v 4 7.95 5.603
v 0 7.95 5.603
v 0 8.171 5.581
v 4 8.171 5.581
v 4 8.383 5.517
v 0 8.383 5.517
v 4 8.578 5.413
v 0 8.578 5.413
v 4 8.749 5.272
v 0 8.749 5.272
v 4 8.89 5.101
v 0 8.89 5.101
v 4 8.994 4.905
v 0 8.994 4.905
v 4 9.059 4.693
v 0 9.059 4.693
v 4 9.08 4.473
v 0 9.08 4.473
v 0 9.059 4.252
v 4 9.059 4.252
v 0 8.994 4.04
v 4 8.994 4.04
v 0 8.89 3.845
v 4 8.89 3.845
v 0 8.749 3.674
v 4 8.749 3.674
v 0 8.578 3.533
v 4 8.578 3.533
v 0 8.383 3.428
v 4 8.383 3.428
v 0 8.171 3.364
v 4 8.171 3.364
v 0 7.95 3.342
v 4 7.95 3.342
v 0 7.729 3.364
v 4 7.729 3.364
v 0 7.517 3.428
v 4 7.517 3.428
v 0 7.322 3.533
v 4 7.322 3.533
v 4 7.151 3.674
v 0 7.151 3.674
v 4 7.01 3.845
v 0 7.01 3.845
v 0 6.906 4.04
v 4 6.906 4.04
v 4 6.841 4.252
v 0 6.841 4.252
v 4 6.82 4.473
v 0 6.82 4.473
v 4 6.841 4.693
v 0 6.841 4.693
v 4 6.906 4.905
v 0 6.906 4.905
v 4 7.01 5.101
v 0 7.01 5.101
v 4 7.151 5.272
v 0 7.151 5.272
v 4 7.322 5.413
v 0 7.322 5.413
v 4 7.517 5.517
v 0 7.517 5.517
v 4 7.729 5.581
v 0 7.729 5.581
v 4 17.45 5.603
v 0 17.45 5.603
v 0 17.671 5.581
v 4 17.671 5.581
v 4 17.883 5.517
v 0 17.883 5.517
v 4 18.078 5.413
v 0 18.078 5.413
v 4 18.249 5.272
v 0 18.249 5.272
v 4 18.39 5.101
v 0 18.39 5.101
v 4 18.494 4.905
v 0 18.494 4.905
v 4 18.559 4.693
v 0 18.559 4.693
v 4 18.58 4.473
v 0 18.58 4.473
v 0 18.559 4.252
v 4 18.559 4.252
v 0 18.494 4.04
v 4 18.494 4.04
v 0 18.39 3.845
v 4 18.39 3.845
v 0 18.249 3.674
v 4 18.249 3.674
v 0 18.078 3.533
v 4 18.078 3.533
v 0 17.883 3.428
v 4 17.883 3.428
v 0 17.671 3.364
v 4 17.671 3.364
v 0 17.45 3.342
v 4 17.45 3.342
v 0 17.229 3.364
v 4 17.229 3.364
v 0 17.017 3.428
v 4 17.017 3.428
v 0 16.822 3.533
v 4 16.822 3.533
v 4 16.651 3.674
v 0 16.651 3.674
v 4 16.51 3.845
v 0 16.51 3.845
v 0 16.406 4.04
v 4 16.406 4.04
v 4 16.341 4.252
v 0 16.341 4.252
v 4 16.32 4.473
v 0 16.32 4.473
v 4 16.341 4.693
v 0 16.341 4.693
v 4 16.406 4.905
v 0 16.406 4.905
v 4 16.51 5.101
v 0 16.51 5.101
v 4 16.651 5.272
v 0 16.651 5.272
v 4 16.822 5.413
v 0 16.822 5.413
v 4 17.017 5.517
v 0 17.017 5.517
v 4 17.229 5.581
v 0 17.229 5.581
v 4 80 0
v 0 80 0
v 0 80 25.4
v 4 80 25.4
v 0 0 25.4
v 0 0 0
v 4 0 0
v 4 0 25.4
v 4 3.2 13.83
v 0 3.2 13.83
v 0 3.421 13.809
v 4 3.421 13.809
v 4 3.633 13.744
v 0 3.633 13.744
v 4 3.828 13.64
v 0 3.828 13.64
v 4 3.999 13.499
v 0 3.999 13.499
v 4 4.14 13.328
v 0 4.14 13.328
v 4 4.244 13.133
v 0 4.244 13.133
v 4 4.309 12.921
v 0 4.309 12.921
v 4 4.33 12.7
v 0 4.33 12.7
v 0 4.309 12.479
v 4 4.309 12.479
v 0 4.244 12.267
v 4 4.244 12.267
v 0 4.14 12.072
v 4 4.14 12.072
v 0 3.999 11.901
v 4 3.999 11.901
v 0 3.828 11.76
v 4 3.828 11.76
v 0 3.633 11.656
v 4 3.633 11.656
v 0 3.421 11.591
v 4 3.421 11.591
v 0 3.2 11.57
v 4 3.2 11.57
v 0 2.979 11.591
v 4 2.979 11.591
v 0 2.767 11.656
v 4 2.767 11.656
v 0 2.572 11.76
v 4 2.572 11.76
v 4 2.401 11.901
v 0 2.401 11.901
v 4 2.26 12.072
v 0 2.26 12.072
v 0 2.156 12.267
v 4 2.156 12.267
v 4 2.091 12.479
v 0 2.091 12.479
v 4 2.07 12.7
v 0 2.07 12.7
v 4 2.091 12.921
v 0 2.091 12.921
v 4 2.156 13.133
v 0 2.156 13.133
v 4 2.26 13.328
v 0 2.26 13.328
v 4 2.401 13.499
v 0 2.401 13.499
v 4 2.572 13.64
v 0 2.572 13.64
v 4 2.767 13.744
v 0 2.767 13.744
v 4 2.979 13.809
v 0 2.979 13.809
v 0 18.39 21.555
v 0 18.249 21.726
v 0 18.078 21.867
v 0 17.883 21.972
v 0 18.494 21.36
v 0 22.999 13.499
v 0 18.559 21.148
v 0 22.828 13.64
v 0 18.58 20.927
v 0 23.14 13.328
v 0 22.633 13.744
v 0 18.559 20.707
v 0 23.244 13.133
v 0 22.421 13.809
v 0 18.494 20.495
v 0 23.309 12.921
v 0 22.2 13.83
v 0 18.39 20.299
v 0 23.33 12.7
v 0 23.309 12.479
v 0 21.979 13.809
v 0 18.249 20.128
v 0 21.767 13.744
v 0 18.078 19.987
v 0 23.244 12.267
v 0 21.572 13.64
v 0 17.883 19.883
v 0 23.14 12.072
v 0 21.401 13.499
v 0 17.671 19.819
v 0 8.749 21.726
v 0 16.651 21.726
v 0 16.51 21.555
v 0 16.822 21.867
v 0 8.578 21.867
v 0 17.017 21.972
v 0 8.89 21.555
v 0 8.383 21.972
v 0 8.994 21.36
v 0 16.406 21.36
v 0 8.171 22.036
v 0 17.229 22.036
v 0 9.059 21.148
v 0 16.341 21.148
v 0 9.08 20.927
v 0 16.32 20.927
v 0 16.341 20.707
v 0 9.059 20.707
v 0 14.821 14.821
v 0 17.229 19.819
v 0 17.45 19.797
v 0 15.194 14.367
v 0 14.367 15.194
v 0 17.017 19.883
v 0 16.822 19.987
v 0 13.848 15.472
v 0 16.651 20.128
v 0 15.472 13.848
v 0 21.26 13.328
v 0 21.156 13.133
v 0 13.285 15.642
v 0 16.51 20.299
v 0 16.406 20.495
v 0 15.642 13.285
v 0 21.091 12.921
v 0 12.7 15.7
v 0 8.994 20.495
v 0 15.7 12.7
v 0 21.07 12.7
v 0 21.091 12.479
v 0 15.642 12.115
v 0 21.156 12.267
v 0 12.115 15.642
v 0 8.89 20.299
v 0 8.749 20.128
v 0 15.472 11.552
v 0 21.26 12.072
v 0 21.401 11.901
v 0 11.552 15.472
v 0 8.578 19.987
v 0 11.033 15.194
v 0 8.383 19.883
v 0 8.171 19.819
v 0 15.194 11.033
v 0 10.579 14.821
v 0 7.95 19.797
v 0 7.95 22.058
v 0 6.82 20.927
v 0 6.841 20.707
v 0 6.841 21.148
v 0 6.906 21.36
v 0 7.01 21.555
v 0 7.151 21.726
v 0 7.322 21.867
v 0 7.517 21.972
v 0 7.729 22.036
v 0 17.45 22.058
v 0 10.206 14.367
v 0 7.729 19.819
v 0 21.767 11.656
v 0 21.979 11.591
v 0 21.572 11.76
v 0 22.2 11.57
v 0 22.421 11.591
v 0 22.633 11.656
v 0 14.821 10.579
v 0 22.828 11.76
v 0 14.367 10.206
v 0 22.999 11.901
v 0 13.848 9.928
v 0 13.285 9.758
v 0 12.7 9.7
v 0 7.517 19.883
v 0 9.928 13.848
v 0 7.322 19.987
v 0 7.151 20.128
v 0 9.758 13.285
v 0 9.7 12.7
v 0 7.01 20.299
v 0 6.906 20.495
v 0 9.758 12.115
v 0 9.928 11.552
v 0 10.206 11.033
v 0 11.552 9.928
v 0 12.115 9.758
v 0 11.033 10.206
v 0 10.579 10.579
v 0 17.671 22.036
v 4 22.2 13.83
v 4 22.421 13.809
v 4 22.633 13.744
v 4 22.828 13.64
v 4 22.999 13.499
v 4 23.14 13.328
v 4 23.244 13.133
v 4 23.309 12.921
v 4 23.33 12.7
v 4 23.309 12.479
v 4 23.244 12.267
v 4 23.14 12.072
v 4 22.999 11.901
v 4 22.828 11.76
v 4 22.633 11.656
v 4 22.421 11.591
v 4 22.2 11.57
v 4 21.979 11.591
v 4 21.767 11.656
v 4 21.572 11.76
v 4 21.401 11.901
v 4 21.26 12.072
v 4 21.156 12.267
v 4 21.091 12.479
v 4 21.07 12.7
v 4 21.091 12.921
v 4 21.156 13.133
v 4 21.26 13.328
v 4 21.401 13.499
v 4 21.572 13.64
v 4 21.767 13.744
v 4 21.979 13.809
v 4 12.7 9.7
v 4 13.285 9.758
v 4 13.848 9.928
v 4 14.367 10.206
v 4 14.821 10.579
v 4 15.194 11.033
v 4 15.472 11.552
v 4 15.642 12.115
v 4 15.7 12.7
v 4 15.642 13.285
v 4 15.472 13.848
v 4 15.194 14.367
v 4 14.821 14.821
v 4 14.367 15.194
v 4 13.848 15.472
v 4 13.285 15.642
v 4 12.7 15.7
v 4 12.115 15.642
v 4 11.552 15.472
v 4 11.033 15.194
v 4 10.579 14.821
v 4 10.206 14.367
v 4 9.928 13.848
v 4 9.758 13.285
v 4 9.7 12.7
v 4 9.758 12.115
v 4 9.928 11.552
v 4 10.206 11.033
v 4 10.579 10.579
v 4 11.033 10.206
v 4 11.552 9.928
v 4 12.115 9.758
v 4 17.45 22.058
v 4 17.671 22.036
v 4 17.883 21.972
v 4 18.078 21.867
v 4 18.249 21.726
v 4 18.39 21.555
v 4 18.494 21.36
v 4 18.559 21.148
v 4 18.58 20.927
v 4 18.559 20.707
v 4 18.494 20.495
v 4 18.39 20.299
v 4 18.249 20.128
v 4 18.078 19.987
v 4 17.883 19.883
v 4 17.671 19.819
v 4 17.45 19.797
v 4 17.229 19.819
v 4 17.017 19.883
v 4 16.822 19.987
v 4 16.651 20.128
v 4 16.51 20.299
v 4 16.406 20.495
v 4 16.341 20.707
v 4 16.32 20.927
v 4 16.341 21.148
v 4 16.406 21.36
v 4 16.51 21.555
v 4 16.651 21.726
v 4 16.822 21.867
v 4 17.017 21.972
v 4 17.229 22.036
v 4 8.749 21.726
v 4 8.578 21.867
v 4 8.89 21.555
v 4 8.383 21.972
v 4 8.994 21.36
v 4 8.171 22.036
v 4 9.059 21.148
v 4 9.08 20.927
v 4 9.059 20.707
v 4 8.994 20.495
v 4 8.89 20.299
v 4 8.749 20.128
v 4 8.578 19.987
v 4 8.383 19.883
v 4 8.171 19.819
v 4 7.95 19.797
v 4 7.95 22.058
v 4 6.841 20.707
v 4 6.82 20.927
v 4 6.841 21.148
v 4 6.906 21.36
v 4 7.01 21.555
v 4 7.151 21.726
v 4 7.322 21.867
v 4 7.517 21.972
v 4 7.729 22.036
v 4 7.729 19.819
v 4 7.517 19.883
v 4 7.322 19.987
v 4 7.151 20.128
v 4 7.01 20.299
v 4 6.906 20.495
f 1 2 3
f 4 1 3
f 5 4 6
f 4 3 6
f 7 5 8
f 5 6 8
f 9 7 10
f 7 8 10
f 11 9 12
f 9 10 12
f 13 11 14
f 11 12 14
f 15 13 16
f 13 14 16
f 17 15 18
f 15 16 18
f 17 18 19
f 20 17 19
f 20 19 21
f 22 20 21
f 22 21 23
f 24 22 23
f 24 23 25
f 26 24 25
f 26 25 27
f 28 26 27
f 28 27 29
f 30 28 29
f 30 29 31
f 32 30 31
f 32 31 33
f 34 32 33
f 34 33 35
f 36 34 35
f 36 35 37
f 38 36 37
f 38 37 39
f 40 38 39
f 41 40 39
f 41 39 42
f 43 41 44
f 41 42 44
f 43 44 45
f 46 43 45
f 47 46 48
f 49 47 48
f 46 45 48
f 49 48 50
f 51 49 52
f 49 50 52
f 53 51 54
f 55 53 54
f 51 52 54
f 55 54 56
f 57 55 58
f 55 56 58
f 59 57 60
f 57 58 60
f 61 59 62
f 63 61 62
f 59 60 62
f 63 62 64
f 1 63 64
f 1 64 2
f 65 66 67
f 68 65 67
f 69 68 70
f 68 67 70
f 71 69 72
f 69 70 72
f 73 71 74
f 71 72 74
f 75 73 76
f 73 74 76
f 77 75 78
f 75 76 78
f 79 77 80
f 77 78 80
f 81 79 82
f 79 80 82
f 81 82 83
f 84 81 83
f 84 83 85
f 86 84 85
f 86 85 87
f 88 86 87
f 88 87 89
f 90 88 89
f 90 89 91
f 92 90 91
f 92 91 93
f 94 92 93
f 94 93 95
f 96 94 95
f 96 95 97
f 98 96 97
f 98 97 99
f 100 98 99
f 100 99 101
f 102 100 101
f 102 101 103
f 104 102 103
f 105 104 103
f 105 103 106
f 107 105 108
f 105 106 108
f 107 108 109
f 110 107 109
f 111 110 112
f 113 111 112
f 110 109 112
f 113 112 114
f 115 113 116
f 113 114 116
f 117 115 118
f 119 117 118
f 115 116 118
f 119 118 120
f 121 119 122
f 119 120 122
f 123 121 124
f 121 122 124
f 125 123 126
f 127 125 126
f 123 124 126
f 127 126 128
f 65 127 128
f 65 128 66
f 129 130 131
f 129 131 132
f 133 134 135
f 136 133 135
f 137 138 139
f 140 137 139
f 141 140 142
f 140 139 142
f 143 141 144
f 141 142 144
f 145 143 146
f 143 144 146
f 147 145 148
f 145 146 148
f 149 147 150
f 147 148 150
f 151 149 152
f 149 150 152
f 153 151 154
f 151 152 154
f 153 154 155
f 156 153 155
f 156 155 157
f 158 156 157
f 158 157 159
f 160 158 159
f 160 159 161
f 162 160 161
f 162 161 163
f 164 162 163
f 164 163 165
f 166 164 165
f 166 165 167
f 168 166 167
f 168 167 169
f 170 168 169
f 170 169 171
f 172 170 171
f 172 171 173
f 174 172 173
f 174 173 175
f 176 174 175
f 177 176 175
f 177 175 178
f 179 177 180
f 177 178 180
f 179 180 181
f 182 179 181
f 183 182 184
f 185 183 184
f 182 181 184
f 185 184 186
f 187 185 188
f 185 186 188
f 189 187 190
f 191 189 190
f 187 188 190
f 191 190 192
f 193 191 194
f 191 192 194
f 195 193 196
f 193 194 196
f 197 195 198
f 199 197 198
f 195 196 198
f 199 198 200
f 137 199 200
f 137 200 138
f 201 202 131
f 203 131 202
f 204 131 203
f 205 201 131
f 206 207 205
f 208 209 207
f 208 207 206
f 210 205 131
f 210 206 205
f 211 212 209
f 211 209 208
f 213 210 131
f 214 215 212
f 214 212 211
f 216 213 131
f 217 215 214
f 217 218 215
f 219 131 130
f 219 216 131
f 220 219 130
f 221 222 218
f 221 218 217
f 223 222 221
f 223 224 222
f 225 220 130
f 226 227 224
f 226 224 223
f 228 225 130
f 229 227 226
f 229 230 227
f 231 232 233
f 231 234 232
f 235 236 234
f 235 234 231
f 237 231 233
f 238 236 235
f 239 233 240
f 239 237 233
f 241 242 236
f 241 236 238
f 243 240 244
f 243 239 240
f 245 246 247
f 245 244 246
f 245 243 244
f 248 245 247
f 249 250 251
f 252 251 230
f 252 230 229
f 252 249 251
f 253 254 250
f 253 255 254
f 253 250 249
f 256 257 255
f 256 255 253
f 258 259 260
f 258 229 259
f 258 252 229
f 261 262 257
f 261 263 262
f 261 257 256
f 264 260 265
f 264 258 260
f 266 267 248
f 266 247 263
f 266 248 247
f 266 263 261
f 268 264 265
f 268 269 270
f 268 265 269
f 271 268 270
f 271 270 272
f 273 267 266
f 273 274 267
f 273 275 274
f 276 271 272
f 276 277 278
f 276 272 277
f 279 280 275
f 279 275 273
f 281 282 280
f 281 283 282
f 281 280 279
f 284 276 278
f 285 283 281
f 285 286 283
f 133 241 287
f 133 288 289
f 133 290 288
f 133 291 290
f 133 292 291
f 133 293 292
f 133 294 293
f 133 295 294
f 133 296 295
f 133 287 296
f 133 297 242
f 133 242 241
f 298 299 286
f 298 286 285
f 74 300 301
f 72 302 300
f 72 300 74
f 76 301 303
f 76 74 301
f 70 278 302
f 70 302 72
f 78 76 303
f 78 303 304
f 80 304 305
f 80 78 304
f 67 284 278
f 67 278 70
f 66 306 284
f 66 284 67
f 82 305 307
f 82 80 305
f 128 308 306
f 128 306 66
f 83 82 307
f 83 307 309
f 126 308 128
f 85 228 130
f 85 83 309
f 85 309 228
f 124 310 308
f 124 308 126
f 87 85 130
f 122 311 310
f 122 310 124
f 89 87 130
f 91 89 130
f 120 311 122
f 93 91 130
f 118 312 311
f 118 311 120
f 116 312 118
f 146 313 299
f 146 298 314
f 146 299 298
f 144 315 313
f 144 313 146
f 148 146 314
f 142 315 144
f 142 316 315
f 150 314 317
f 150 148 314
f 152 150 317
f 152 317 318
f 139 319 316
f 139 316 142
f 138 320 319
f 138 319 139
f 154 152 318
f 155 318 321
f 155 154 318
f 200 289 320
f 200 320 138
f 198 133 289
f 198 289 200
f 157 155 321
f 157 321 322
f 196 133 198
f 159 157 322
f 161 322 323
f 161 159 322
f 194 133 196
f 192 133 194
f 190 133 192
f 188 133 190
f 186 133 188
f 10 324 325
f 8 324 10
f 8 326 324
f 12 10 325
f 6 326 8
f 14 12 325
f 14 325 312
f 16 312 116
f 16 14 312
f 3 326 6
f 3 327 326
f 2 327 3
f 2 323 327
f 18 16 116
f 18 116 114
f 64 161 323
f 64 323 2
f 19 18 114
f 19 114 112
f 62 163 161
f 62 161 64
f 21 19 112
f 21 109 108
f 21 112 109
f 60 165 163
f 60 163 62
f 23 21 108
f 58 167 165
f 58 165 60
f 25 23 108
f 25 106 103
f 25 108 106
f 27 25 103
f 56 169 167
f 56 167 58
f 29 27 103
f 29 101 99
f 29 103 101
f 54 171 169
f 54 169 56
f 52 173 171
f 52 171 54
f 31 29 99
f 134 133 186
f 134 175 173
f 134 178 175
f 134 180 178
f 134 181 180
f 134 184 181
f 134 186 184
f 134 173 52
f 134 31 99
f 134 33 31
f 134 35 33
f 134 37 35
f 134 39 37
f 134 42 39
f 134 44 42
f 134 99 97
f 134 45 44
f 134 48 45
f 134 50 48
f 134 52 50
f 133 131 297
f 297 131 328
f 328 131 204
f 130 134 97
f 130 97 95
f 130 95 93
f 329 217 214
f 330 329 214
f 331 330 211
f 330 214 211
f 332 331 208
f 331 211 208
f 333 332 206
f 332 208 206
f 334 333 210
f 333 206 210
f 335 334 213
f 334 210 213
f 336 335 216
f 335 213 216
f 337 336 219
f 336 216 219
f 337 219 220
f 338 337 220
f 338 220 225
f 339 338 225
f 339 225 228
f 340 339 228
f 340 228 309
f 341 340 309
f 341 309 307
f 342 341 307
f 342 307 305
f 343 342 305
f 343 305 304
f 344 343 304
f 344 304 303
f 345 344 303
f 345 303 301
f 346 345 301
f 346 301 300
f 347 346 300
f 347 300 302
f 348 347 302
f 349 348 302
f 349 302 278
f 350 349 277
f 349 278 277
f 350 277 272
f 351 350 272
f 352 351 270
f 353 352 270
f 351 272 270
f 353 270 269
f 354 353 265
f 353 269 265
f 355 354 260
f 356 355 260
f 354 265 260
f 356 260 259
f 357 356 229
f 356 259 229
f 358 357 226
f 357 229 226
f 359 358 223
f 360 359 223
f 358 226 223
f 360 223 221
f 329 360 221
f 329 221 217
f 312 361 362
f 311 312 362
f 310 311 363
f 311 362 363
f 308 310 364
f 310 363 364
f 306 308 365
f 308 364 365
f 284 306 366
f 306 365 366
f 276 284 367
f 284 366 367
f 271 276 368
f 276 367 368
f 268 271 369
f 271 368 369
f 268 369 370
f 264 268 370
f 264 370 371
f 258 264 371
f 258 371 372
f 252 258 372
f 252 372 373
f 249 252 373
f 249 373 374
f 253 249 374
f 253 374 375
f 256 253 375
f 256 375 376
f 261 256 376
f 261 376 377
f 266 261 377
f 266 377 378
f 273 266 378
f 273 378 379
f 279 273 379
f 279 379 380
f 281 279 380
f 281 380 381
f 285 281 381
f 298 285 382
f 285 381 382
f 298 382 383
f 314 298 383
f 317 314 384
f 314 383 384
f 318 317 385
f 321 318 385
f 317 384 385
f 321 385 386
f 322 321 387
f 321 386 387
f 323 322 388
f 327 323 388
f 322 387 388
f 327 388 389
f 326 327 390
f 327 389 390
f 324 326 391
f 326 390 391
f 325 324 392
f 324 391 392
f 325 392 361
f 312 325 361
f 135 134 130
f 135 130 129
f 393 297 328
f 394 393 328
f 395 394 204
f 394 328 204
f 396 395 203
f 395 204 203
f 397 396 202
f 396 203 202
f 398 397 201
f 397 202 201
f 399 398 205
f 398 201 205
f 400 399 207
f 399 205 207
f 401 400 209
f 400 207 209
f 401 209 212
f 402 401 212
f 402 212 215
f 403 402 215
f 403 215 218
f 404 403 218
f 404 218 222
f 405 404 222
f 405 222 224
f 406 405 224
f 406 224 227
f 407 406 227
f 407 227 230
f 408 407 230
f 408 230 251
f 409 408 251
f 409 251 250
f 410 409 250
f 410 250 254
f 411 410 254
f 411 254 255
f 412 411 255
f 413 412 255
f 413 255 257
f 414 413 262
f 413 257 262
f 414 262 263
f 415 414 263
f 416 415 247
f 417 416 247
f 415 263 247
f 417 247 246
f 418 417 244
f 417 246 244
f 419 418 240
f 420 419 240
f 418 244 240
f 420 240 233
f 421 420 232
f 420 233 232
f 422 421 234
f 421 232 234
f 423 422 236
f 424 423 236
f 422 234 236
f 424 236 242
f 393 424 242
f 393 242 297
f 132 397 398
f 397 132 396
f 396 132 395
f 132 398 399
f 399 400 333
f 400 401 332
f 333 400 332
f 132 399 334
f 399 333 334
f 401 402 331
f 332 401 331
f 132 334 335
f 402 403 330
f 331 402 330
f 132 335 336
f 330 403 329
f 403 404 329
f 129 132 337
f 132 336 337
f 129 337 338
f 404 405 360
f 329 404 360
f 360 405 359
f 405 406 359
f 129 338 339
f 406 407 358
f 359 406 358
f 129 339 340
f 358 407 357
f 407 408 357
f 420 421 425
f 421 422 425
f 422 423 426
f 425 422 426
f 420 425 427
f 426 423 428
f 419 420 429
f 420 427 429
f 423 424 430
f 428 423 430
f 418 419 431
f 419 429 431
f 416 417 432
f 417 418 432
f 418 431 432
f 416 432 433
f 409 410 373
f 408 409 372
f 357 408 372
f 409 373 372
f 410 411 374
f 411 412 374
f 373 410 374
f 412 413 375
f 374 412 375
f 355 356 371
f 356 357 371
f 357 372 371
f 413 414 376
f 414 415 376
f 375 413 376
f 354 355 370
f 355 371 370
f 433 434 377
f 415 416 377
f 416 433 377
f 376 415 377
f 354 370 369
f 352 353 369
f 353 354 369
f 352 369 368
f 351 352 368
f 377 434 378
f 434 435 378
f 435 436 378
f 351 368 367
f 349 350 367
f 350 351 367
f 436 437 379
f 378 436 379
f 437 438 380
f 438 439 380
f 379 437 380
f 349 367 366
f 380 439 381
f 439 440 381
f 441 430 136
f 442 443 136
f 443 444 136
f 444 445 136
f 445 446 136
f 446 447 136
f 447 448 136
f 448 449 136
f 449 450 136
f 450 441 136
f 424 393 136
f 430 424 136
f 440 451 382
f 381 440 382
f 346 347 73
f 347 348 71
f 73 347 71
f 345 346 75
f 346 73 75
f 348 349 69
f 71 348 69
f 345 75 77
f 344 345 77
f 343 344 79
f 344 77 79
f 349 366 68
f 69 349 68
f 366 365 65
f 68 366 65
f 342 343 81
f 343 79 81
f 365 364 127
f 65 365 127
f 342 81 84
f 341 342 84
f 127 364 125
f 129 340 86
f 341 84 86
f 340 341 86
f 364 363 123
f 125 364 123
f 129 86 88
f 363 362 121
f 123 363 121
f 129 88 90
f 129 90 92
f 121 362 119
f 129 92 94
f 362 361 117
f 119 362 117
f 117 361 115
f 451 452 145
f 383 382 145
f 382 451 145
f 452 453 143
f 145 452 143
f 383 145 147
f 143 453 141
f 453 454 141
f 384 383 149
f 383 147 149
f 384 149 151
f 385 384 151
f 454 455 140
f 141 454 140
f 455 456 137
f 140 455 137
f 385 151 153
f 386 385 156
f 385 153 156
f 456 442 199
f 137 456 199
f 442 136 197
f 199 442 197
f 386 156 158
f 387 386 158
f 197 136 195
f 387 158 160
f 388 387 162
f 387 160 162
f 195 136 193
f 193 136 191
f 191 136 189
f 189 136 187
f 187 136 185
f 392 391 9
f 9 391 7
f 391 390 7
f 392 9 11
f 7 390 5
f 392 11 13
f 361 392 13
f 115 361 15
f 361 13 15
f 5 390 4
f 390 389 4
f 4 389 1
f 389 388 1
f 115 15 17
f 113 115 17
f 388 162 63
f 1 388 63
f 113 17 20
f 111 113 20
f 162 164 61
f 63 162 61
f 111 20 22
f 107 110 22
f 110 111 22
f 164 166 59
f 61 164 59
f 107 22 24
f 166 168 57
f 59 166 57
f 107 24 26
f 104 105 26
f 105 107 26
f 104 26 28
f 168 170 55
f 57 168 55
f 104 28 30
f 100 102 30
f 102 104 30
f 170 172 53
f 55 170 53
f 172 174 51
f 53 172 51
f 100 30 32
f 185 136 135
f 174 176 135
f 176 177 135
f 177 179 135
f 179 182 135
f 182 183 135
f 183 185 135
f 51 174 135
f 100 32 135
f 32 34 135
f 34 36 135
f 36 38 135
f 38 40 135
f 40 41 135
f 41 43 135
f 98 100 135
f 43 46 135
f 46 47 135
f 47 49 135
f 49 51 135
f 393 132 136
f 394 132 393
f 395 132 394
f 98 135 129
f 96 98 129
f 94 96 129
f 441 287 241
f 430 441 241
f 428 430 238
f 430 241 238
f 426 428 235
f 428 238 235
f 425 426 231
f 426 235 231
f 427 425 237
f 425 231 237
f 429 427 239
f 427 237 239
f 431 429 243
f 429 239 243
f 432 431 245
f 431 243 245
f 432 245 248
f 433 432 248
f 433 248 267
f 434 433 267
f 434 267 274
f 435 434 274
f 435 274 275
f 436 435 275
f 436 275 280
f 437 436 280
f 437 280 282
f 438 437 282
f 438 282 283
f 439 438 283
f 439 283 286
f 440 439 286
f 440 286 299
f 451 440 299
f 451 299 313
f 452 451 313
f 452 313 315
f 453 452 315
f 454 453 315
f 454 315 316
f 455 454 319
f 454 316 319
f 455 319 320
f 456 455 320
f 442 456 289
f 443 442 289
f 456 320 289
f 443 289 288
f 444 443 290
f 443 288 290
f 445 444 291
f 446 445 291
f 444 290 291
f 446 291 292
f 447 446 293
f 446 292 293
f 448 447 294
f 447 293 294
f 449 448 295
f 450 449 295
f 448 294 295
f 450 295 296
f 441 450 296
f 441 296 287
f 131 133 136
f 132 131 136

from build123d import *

# Parameters (mm, degrees)
SKETCH2_W                 = 4
SKETCH2_H                 = 25.4
BOSS_EXTRUDE1_DEPTH       = 80
F_4_40_TAPPED_HOLE1_D     = 2.2606
F_4_40_TAPPED_HOLE1_DEPTH = 7.6
F_4_40_TAPPED_HOLE1_TIP   = 0.679152758
SKETCH6_R                 = 3
CUT_EXTRUDE1_DEPTH        = 80


with BuildPart() as part:
    # Sketch2 → Boss-Extrude1 (new body)
    with BuildSketch(Plane(origin=(0, 0, 0), x_dir=(1, 0, 0), z_dir=(0, 1, 0))):
        with Locations((2, -12.7)):
            Rectangle(SKETCH2_W, SKETCH2_H)
    extrude(amount=BOSS_EXTRUDE1_DEPTH)

    # #4-40 Tapped Hole1
    with Locations(Plane(origin=(4, 0, 0), x_dir=(0, 0, -1), z_dir=(1, 0, 0))):
        with Locations((-12.7, 22.2), (-4.472758664, 17.45), (-4.472758664, 7.95), (-12.7, 3.2), (-20.927241336, 7.95), (-20.927241336, 17.45)):
            Hole(F_4_40_TAPPED_HOLE1_D / 2, depth=F_4_40_TAPPED_HOLE1_DEPTH)
            with Locations((0, 0, -(F_4_40_TAPPED_HOLE1_DEPTH + F_4_40_TAPPED_HOLE1_TIP / 2))):  # 118° drill point
                Cone(0, F_4_40_TAPPED_HOLE1_D / 2, F_4_40_TAPPED_HOLE1_TIP, mode=Mode.SUBTRACT)

    # Sketch6 → Cut-Extrude1 (cut)
    with BuildSketch(Plane(origin=(4, 0, 0), x_dir=(0, 0, -1), z_dir=(1, 0, 0))):
        with Locations((-12.7, 12.7)):
            Circle(SKETCH6_R)
    extrude(amount=-CUT_EXTRUDE1_DEPTH, mode=Mode.SUBTRACT)


solid = part.part
